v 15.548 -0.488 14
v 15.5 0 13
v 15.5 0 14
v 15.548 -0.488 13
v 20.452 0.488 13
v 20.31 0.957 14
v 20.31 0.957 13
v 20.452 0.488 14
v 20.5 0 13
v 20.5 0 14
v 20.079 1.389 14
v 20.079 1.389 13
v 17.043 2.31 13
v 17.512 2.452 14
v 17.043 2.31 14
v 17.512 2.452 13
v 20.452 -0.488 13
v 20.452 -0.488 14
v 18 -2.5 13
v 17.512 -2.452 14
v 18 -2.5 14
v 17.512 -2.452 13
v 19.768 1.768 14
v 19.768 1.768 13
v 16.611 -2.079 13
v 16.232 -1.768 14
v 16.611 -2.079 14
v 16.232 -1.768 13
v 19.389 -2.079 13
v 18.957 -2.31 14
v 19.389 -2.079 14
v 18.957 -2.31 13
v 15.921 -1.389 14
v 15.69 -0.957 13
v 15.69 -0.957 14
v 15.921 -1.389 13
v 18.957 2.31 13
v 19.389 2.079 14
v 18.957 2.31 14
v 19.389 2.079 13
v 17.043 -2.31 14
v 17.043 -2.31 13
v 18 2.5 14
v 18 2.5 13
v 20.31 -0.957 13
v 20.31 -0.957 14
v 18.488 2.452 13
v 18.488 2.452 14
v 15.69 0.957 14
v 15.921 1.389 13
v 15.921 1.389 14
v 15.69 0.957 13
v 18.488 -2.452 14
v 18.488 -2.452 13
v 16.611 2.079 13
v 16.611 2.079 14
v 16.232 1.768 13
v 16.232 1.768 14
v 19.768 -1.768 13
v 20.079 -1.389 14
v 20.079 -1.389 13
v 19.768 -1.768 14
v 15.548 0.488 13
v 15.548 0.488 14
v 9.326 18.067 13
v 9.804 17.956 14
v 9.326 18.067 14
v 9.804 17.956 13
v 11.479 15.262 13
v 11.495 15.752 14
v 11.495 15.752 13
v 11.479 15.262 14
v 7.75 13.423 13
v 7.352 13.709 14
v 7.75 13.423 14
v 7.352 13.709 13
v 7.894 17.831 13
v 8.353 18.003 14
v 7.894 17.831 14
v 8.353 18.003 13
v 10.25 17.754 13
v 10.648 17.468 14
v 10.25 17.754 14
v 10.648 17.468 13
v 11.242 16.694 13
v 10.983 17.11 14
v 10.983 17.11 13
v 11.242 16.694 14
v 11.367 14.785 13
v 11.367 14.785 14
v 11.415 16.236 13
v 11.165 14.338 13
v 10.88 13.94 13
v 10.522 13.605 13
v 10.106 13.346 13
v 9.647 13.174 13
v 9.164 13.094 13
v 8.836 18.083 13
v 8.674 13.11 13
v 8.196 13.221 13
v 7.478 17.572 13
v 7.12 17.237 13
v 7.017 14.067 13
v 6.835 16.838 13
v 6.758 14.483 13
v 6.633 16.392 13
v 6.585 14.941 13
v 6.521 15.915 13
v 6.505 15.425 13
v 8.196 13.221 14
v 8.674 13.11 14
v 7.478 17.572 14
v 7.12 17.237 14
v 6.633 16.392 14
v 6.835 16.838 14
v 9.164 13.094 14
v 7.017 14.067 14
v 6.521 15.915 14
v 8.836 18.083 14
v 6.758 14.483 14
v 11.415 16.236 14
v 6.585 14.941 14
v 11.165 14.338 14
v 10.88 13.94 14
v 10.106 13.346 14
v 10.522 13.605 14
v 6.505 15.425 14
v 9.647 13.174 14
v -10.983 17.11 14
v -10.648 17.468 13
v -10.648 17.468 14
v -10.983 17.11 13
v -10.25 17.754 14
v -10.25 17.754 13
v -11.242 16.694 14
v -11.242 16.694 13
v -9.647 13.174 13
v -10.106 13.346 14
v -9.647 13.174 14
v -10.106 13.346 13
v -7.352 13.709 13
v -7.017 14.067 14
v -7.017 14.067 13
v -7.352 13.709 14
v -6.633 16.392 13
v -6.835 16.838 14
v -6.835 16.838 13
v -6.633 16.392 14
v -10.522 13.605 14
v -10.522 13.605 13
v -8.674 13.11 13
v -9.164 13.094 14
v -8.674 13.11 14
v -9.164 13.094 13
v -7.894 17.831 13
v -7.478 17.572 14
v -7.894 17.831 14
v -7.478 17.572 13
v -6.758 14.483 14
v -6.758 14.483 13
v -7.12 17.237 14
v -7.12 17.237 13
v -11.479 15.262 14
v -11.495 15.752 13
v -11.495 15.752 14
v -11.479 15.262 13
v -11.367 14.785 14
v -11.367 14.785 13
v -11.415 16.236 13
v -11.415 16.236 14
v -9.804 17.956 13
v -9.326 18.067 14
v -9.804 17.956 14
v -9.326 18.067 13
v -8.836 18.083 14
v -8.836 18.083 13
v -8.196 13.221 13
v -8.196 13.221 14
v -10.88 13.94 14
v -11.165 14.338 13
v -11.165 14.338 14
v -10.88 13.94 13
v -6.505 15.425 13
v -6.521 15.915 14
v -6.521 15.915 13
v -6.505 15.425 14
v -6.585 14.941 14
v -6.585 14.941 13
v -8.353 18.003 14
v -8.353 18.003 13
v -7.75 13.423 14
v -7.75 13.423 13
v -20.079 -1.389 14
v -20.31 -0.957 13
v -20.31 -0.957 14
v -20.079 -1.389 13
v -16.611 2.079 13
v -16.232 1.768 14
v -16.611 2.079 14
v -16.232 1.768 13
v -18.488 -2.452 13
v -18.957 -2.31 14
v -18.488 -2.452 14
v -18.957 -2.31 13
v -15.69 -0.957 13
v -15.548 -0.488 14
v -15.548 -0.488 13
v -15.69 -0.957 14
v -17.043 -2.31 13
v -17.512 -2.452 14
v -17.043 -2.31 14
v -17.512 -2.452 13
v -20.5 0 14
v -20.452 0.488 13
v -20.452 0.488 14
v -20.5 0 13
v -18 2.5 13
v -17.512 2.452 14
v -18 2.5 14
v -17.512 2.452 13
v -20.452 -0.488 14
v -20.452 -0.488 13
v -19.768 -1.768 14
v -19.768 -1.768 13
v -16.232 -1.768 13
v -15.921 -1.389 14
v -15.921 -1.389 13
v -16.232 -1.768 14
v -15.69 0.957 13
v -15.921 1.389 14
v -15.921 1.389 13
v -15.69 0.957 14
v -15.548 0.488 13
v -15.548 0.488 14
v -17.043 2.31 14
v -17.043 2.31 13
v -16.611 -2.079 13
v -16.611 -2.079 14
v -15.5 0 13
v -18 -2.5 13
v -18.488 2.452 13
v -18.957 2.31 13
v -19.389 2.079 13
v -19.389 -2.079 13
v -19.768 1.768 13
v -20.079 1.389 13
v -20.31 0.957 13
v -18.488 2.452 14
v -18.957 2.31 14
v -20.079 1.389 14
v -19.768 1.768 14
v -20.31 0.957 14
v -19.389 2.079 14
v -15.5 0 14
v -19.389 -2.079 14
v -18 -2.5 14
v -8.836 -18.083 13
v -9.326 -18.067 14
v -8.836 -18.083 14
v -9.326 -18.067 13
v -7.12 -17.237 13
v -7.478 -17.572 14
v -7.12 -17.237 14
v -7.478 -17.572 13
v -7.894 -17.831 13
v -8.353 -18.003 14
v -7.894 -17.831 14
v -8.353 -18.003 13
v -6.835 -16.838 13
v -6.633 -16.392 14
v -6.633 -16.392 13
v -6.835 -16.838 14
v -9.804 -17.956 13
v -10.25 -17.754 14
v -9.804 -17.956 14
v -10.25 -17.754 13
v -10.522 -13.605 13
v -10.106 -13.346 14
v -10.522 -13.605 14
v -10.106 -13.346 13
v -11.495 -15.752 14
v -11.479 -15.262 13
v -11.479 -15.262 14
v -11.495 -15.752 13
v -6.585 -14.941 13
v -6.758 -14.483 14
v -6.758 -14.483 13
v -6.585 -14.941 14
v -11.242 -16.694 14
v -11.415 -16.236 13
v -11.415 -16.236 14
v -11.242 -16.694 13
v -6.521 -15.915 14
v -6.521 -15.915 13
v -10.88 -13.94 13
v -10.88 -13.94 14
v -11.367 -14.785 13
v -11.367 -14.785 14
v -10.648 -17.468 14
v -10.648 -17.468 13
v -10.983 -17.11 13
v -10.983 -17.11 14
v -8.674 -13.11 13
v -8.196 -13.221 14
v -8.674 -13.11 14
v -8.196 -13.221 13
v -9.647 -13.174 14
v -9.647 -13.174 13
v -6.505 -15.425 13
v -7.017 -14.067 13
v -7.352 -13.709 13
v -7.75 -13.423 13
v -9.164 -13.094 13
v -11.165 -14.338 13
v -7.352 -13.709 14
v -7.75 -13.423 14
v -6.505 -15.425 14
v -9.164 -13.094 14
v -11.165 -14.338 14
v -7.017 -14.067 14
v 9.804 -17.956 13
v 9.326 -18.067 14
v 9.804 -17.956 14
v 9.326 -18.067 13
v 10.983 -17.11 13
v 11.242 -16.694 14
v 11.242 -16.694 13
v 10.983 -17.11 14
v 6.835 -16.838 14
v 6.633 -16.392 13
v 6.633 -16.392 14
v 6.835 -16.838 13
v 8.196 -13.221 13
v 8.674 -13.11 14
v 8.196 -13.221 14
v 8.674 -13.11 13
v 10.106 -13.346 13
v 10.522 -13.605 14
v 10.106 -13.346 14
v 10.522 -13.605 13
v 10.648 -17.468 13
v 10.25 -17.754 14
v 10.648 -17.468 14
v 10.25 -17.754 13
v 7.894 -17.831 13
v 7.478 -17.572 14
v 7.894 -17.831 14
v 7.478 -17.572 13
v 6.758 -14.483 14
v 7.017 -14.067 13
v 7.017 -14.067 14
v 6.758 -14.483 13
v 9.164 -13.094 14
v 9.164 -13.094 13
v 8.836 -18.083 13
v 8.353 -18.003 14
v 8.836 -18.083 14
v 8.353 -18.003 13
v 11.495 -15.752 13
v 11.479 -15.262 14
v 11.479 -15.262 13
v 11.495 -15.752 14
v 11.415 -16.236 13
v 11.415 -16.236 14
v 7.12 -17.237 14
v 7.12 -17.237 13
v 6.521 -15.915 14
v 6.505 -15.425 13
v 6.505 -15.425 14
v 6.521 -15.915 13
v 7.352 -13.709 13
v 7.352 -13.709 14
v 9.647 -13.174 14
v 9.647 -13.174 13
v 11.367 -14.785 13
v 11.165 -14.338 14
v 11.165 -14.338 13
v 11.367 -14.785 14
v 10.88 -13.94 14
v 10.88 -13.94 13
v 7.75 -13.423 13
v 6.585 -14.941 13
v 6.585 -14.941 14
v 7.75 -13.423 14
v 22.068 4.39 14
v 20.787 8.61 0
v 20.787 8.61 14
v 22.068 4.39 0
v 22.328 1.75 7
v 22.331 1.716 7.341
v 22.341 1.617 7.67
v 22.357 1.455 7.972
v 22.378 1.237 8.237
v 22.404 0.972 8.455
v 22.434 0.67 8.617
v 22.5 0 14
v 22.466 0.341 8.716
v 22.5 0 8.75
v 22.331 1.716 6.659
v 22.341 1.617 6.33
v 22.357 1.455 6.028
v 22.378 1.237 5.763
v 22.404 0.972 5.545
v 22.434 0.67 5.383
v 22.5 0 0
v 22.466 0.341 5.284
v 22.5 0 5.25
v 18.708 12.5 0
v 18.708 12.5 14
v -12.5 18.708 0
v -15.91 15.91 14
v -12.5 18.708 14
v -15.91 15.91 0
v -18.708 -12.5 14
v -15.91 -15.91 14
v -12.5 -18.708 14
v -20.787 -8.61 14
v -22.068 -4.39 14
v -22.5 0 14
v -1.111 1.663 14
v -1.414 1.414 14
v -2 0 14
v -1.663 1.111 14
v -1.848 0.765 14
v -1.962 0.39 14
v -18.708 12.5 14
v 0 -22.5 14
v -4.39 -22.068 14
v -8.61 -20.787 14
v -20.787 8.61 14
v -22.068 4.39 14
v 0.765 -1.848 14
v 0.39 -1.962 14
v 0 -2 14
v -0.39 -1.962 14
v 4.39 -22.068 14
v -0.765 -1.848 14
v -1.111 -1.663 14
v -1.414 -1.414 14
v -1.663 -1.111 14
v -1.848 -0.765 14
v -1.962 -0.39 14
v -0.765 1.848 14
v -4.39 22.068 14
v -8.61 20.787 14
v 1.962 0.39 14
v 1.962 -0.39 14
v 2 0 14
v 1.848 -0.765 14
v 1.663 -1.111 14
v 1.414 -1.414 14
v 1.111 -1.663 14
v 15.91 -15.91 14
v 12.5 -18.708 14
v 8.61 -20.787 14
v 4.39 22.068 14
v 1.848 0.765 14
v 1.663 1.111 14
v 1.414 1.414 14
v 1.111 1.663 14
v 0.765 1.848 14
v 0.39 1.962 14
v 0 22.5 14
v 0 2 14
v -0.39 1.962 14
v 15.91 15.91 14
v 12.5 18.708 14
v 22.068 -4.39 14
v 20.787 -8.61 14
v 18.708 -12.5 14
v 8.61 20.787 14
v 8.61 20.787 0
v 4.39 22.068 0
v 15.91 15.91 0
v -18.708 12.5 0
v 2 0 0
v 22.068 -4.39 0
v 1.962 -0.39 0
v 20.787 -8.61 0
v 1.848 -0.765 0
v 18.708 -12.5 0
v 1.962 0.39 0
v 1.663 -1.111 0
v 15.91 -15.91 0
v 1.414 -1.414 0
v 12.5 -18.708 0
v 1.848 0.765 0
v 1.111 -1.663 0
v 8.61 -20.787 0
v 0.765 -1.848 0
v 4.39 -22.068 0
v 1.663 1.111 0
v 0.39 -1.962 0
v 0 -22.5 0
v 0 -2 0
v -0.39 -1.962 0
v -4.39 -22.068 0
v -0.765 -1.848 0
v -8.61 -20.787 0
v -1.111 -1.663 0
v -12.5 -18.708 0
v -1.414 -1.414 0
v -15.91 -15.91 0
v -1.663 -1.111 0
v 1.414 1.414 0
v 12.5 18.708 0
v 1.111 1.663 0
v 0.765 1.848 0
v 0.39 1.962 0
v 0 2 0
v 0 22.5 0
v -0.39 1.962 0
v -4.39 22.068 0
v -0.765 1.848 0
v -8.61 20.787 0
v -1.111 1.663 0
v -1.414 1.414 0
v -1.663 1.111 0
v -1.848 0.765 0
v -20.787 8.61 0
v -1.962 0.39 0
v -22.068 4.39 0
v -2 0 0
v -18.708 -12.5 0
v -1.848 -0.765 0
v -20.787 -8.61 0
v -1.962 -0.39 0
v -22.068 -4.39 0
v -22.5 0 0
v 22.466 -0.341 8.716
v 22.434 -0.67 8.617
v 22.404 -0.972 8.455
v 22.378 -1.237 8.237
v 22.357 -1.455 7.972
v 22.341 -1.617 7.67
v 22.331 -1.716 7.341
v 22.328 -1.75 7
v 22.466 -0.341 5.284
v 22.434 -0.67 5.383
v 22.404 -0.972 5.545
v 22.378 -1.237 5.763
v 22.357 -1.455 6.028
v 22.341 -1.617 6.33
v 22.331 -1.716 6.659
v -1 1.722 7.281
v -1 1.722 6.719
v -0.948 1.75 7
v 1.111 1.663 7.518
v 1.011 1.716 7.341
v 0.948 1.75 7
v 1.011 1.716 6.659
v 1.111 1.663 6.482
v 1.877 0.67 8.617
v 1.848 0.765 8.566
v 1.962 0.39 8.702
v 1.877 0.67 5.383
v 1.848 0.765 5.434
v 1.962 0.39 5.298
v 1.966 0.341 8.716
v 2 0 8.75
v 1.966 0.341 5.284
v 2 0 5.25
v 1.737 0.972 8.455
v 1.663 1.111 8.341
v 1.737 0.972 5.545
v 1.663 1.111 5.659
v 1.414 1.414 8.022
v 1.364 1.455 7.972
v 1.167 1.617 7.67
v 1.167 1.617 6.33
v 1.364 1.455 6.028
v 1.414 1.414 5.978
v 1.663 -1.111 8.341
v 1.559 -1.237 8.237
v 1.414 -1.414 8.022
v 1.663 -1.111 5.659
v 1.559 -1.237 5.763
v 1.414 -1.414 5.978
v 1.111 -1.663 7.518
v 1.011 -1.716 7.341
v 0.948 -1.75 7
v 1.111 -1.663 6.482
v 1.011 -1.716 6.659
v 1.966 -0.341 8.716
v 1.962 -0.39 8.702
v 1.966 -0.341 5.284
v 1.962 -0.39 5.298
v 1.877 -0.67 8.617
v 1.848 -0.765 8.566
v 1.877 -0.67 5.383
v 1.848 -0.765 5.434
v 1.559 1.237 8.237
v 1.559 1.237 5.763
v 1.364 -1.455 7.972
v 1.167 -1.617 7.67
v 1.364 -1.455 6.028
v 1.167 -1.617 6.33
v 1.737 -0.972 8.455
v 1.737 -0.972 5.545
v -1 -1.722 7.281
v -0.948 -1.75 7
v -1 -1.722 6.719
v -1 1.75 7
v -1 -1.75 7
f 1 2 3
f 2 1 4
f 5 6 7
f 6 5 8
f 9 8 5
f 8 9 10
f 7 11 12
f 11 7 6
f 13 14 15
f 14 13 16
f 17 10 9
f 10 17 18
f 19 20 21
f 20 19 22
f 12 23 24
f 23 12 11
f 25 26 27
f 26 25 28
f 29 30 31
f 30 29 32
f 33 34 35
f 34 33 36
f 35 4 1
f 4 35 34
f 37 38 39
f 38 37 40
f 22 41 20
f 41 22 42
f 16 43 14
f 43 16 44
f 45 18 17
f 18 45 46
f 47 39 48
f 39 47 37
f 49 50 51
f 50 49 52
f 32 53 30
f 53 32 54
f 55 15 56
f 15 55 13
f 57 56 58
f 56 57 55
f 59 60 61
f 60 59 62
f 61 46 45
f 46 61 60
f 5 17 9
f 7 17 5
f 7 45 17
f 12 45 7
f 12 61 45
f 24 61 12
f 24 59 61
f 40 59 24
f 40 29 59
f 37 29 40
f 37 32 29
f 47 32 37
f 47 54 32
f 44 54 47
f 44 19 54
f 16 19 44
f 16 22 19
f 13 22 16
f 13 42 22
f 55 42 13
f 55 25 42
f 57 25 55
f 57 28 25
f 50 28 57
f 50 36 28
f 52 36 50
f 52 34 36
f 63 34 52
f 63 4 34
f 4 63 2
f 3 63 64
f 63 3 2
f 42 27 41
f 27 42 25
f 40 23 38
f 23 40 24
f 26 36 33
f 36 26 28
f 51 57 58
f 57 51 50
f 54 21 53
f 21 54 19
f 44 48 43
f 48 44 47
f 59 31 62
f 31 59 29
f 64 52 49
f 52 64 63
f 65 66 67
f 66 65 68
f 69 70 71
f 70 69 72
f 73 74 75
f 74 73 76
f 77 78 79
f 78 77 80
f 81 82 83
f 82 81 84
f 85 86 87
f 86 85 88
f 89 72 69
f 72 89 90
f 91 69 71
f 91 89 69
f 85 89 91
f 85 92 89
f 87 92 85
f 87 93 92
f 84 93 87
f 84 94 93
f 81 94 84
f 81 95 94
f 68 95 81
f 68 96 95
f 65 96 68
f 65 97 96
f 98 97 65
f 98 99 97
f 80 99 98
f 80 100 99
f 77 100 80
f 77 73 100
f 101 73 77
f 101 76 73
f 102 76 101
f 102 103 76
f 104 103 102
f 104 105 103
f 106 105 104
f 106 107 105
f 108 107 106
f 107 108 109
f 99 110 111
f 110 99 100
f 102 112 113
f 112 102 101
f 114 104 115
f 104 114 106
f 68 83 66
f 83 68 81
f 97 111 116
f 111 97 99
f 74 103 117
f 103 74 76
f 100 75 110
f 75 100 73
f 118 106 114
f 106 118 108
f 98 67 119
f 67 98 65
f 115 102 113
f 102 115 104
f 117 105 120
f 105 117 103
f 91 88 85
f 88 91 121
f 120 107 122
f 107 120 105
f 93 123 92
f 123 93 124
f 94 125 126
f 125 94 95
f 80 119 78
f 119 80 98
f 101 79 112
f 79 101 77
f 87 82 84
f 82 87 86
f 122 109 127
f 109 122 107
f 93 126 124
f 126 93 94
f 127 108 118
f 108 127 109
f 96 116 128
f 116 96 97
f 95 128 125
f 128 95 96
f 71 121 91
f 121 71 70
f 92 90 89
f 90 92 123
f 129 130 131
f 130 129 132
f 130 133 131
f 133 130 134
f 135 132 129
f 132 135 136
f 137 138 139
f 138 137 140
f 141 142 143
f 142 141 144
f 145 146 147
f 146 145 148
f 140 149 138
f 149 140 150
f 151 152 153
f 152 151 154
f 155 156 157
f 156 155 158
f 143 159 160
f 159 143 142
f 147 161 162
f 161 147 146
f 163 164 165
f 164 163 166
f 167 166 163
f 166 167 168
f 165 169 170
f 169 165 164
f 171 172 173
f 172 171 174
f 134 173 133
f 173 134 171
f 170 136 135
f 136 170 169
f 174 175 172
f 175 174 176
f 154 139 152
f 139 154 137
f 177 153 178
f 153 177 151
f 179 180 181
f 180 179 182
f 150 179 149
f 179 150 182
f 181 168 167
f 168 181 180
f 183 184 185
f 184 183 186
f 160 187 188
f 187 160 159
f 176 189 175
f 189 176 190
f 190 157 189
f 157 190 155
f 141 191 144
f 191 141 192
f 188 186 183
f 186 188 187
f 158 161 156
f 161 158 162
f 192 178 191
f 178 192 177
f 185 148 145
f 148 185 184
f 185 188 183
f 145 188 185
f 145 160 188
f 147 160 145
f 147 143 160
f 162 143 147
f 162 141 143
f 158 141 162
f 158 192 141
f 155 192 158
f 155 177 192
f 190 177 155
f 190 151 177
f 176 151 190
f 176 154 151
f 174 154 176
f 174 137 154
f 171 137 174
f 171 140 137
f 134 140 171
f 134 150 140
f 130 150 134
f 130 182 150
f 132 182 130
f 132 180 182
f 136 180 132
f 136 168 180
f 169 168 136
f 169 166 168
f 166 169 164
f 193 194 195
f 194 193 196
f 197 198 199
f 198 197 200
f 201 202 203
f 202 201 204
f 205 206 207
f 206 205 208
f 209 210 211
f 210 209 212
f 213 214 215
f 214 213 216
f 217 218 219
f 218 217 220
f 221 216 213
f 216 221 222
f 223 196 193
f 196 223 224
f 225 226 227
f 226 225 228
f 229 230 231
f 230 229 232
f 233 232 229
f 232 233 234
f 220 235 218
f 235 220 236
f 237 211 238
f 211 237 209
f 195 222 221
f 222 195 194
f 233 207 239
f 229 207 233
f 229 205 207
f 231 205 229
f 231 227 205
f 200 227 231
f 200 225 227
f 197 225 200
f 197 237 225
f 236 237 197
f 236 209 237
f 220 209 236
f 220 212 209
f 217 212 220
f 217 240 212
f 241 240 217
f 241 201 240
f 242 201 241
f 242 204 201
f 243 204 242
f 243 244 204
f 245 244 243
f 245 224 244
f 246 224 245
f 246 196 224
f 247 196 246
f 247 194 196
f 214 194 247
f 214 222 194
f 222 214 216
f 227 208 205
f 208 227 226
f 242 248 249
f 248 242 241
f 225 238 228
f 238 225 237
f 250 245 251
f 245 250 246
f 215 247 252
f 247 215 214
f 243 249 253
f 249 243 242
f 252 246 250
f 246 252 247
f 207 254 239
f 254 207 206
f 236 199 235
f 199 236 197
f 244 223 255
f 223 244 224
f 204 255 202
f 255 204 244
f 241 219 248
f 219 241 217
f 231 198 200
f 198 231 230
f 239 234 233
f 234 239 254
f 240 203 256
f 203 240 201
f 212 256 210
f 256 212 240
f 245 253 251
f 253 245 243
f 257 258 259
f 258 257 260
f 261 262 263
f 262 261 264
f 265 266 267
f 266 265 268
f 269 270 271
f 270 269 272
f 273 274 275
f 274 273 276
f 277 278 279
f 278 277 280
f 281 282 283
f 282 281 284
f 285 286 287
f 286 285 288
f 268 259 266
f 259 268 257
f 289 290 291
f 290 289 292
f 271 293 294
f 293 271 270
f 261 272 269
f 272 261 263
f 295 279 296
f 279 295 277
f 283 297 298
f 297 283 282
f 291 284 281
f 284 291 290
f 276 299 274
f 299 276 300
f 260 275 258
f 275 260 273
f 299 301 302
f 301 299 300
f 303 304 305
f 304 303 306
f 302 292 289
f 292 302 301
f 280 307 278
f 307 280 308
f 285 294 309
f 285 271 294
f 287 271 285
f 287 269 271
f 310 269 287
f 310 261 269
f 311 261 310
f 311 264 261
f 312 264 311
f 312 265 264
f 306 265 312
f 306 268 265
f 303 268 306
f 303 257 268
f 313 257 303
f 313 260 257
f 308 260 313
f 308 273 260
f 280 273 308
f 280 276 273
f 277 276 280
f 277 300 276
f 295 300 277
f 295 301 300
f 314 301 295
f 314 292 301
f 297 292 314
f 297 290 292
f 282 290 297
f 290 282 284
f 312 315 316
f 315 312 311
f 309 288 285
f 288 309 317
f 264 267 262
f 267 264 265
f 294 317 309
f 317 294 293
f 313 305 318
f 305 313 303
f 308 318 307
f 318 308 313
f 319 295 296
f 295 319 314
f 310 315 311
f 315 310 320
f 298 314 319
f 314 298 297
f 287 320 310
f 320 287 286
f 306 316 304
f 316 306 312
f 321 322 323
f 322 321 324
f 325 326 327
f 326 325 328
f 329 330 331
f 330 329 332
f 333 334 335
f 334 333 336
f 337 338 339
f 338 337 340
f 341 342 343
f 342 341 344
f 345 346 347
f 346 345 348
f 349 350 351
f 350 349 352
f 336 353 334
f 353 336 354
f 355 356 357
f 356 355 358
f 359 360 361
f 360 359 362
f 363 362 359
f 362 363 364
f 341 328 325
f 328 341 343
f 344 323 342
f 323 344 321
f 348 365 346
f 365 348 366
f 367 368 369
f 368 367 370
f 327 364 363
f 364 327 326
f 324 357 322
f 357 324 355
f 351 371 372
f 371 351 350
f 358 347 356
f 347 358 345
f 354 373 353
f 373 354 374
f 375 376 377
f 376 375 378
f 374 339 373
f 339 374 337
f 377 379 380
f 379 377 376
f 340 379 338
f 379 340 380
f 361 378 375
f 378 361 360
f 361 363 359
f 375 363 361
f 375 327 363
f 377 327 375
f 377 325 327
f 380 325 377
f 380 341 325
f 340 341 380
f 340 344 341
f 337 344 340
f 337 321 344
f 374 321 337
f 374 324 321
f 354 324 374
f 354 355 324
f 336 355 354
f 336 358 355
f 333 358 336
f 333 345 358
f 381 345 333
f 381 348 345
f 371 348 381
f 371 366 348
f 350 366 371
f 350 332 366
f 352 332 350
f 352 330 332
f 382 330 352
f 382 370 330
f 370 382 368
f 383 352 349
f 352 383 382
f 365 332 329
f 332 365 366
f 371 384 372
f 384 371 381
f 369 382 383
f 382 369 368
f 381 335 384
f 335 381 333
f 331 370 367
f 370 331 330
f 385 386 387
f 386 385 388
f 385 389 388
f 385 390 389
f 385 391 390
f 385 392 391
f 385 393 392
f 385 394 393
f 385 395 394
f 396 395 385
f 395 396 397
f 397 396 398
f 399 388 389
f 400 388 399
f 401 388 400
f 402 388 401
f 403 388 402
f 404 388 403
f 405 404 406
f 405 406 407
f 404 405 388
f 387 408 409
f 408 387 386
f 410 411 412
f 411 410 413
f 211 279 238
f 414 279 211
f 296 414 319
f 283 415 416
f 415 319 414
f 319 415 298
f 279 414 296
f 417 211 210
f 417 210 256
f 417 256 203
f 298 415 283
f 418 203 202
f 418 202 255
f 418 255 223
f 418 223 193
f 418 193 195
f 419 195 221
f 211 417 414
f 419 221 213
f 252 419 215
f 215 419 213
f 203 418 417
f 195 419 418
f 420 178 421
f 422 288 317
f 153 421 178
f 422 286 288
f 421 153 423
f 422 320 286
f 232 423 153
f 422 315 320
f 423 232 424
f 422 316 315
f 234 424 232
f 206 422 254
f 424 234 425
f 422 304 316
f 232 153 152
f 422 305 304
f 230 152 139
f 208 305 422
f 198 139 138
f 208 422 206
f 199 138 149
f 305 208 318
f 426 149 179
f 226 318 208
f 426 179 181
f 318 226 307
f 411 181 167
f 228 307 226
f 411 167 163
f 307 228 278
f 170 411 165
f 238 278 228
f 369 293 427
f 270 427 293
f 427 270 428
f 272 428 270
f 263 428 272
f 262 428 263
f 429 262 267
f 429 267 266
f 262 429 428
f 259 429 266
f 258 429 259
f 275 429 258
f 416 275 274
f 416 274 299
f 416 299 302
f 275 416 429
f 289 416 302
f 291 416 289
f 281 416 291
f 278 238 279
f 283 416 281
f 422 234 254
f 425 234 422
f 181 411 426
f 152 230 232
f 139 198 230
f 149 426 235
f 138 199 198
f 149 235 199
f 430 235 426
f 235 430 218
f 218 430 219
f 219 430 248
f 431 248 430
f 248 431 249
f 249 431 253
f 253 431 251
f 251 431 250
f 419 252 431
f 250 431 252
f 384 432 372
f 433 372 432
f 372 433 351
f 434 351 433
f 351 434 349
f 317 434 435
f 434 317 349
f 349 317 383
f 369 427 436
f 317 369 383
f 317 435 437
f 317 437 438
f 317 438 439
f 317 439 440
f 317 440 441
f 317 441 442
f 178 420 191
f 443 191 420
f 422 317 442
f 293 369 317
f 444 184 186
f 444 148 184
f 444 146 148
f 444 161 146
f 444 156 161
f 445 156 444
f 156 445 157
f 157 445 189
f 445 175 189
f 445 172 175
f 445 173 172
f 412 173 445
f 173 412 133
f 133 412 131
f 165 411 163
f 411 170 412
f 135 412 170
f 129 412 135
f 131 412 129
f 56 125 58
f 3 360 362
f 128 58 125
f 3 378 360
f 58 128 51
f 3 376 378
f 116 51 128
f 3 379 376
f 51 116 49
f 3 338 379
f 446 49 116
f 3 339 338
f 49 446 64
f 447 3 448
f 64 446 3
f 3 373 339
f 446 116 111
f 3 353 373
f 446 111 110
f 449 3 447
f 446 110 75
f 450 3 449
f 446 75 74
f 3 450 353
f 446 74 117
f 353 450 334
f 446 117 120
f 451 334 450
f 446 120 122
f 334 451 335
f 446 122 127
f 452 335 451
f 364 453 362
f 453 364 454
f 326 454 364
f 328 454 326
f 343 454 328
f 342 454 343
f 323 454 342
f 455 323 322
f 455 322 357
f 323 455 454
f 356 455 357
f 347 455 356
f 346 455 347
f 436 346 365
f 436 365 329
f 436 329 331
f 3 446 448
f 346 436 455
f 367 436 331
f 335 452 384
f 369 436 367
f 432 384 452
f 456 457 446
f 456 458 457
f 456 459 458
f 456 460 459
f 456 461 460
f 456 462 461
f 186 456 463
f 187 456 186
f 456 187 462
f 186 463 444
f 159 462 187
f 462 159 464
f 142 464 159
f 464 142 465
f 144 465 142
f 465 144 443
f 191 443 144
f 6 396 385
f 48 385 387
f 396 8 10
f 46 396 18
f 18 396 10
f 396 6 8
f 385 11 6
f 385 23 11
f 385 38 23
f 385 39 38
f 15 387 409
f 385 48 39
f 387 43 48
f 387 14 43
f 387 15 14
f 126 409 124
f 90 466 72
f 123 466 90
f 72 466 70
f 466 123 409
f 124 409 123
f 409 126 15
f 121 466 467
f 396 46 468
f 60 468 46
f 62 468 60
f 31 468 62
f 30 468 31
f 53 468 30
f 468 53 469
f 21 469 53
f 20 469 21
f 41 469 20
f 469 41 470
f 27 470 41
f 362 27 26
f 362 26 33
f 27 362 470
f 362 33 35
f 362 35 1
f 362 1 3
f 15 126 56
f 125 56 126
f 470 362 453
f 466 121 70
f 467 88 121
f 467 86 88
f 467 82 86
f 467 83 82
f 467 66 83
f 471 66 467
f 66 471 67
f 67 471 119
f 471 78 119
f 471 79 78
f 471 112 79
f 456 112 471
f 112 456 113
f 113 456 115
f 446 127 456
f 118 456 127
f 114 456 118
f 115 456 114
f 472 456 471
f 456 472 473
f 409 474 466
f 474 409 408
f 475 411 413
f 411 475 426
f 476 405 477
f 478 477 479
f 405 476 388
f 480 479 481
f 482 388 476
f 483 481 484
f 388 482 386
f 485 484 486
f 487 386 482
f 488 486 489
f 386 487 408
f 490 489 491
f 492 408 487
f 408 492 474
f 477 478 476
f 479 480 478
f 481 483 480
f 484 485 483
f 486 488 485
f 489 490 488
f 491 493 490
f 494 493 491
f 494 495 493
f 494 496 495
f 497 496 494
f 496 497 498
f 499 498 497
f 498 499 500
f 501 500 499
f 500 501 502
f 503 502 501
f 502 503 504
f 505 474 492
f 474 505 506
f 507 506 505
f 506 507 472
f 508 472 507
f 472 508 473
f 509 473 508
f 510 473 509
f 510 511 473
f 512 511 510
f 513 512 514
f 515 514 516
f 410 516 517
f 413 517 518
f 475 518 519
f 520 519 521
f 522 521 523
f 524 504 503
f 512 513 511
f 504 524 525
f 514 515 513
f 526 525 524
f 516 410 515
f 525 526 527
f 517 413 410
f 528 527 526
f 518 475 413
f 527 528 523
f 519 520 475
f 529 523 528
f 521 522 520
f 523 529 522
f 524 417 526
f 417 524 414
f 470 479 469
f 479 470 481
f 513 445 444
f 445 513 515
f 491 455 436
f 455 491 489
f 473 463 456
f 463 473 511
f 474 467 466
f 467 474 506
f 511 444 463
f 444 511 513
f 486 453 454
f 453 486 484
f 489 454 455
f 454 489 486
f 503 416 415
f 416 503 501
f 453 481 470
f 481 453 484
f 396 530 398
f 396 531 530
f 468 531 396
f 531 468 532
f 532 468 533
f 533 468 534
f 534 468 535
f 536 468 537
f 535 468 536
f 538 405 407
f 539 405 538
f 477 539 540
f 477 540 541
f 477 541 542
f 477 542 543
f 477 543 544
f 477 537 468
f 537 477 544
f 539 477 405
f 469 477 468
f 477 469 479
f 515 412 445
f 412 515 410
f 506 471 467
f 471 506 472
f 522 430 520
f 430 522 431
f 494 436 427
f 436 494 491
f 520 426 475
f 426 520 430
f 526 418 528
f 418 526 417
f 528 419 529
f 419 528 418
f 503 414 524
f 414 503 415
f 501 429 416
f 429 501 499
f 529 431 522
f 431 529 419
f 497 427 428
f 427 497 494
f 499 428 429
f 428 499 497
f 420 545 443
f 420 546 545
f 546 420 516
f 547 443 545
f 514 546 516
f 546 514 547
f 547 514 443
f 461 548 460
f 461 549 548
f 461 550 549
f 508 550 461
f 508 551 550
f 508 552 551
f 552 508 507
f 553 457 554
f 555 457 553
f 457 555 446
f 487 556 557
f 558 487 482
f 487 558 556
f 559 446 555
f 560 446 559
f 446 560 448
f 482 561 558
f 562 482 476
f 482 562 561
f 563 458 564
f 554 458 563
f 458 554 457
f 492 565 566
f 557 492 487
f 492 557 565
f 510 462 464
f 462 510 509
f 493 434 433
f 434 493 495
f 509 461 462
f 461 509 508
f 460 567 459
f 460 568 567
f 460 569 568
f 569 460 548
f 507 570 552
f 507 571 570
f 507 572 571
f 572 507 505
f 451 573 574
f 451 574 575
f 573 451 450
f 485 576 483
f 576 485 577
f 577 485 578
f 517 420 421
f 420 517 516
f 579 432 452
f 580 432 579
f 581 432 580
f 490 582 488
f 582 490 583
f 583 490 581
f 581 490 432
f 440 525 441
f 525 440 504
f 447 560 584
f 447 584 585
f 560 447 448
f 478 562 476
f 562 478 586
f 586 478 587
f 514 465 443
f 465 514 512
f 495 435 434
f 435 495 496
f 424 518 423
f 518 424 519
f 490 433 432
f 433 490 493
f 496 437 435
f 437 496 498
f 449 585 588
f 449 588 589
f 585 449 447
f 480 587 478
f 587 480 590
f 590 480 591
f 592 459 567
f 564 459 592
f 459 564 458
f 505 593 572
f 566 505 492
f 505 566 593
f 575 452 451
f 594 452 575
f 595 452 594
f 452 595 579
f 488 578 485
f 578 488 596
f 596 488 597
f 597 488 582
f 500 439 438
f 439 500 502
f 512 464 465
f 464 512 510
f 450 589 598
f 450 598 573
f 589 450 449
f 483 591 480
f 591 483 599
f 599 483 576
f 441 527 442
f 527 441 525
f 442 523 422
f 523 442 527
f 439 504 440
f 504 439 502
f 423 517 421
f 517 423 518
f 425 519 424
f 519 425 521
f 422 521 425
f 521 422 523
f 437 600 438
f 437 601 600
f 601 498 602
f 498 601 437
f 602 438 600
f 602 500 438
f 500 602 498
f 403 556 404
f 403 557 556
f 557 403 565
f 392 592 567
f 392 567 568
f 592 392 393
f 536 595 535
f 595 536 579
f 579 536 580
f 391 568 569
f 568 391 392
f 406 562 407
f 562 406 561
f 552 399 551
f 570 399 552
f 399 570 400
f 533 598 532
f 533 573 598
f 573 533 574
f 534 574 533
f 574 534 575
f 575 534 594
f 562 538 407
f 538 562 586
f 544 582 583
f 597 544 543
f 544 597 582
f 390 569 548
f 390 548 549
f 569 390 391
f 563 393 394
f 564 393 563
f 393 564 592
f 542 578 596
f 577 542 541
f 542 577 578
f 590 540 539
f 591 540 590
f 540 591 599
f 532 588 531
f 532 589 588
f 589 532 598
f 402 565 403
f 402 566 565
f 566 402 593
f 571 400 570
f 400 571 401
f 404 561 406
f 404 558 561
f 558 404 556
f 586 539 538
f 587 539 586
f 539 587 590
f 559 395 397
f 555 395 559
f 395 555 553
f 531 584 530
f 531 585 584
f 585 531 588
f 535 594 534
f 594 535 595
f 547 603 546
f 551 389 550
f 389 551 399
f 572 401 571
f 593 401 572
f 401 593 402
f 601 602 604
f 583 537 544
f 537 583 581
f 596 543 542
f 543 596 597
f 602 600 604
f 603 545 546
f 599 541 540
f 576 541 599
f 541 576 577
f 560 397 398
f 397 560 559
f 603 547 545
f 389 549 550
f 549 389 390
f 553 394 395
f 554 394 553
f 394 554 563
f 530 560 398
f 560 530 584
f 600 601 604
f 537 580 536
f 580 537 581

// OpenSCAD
$fn = 32;

// ----------------------------------------------------------------------
// Control knob: dimpled knob
// ----------------------------------------------------------------------

// --- parameters (mm) ---
dimp_d = 5;               // finger dimple diameter
n_dimp = 6;               // number of dimples
dimp_r = 18;              // dimple ring radius
knob_d = 45;              // knob body diameter
knob_h = 14;              // knob body height
bore_d = 4;               // shaft bore diameter
set_d = 3.5;              // set screw bore diameter

dimp_step = 360 / n_dimp;  // dimple angular step

difference() {
  cylinder(h = knob_h, d = knob_d);
  translate([0, 0, -1]) cylinder(h = knob_h + 2, d = bore_d);
  translate([-1, 0, knob_h / 2]) rotate([0, 90, 0])
    cylinder(h = knob_d / 2 + bore_d / 2 + 2, d = set_d);  for (i = [0 : n_dimp - 1])
    rotate([0, 0, i * dimp_step])
      translate([dimp_r, 0, knob_h - 1])
        cylinder(h = 2, d = dimp_d);
}
